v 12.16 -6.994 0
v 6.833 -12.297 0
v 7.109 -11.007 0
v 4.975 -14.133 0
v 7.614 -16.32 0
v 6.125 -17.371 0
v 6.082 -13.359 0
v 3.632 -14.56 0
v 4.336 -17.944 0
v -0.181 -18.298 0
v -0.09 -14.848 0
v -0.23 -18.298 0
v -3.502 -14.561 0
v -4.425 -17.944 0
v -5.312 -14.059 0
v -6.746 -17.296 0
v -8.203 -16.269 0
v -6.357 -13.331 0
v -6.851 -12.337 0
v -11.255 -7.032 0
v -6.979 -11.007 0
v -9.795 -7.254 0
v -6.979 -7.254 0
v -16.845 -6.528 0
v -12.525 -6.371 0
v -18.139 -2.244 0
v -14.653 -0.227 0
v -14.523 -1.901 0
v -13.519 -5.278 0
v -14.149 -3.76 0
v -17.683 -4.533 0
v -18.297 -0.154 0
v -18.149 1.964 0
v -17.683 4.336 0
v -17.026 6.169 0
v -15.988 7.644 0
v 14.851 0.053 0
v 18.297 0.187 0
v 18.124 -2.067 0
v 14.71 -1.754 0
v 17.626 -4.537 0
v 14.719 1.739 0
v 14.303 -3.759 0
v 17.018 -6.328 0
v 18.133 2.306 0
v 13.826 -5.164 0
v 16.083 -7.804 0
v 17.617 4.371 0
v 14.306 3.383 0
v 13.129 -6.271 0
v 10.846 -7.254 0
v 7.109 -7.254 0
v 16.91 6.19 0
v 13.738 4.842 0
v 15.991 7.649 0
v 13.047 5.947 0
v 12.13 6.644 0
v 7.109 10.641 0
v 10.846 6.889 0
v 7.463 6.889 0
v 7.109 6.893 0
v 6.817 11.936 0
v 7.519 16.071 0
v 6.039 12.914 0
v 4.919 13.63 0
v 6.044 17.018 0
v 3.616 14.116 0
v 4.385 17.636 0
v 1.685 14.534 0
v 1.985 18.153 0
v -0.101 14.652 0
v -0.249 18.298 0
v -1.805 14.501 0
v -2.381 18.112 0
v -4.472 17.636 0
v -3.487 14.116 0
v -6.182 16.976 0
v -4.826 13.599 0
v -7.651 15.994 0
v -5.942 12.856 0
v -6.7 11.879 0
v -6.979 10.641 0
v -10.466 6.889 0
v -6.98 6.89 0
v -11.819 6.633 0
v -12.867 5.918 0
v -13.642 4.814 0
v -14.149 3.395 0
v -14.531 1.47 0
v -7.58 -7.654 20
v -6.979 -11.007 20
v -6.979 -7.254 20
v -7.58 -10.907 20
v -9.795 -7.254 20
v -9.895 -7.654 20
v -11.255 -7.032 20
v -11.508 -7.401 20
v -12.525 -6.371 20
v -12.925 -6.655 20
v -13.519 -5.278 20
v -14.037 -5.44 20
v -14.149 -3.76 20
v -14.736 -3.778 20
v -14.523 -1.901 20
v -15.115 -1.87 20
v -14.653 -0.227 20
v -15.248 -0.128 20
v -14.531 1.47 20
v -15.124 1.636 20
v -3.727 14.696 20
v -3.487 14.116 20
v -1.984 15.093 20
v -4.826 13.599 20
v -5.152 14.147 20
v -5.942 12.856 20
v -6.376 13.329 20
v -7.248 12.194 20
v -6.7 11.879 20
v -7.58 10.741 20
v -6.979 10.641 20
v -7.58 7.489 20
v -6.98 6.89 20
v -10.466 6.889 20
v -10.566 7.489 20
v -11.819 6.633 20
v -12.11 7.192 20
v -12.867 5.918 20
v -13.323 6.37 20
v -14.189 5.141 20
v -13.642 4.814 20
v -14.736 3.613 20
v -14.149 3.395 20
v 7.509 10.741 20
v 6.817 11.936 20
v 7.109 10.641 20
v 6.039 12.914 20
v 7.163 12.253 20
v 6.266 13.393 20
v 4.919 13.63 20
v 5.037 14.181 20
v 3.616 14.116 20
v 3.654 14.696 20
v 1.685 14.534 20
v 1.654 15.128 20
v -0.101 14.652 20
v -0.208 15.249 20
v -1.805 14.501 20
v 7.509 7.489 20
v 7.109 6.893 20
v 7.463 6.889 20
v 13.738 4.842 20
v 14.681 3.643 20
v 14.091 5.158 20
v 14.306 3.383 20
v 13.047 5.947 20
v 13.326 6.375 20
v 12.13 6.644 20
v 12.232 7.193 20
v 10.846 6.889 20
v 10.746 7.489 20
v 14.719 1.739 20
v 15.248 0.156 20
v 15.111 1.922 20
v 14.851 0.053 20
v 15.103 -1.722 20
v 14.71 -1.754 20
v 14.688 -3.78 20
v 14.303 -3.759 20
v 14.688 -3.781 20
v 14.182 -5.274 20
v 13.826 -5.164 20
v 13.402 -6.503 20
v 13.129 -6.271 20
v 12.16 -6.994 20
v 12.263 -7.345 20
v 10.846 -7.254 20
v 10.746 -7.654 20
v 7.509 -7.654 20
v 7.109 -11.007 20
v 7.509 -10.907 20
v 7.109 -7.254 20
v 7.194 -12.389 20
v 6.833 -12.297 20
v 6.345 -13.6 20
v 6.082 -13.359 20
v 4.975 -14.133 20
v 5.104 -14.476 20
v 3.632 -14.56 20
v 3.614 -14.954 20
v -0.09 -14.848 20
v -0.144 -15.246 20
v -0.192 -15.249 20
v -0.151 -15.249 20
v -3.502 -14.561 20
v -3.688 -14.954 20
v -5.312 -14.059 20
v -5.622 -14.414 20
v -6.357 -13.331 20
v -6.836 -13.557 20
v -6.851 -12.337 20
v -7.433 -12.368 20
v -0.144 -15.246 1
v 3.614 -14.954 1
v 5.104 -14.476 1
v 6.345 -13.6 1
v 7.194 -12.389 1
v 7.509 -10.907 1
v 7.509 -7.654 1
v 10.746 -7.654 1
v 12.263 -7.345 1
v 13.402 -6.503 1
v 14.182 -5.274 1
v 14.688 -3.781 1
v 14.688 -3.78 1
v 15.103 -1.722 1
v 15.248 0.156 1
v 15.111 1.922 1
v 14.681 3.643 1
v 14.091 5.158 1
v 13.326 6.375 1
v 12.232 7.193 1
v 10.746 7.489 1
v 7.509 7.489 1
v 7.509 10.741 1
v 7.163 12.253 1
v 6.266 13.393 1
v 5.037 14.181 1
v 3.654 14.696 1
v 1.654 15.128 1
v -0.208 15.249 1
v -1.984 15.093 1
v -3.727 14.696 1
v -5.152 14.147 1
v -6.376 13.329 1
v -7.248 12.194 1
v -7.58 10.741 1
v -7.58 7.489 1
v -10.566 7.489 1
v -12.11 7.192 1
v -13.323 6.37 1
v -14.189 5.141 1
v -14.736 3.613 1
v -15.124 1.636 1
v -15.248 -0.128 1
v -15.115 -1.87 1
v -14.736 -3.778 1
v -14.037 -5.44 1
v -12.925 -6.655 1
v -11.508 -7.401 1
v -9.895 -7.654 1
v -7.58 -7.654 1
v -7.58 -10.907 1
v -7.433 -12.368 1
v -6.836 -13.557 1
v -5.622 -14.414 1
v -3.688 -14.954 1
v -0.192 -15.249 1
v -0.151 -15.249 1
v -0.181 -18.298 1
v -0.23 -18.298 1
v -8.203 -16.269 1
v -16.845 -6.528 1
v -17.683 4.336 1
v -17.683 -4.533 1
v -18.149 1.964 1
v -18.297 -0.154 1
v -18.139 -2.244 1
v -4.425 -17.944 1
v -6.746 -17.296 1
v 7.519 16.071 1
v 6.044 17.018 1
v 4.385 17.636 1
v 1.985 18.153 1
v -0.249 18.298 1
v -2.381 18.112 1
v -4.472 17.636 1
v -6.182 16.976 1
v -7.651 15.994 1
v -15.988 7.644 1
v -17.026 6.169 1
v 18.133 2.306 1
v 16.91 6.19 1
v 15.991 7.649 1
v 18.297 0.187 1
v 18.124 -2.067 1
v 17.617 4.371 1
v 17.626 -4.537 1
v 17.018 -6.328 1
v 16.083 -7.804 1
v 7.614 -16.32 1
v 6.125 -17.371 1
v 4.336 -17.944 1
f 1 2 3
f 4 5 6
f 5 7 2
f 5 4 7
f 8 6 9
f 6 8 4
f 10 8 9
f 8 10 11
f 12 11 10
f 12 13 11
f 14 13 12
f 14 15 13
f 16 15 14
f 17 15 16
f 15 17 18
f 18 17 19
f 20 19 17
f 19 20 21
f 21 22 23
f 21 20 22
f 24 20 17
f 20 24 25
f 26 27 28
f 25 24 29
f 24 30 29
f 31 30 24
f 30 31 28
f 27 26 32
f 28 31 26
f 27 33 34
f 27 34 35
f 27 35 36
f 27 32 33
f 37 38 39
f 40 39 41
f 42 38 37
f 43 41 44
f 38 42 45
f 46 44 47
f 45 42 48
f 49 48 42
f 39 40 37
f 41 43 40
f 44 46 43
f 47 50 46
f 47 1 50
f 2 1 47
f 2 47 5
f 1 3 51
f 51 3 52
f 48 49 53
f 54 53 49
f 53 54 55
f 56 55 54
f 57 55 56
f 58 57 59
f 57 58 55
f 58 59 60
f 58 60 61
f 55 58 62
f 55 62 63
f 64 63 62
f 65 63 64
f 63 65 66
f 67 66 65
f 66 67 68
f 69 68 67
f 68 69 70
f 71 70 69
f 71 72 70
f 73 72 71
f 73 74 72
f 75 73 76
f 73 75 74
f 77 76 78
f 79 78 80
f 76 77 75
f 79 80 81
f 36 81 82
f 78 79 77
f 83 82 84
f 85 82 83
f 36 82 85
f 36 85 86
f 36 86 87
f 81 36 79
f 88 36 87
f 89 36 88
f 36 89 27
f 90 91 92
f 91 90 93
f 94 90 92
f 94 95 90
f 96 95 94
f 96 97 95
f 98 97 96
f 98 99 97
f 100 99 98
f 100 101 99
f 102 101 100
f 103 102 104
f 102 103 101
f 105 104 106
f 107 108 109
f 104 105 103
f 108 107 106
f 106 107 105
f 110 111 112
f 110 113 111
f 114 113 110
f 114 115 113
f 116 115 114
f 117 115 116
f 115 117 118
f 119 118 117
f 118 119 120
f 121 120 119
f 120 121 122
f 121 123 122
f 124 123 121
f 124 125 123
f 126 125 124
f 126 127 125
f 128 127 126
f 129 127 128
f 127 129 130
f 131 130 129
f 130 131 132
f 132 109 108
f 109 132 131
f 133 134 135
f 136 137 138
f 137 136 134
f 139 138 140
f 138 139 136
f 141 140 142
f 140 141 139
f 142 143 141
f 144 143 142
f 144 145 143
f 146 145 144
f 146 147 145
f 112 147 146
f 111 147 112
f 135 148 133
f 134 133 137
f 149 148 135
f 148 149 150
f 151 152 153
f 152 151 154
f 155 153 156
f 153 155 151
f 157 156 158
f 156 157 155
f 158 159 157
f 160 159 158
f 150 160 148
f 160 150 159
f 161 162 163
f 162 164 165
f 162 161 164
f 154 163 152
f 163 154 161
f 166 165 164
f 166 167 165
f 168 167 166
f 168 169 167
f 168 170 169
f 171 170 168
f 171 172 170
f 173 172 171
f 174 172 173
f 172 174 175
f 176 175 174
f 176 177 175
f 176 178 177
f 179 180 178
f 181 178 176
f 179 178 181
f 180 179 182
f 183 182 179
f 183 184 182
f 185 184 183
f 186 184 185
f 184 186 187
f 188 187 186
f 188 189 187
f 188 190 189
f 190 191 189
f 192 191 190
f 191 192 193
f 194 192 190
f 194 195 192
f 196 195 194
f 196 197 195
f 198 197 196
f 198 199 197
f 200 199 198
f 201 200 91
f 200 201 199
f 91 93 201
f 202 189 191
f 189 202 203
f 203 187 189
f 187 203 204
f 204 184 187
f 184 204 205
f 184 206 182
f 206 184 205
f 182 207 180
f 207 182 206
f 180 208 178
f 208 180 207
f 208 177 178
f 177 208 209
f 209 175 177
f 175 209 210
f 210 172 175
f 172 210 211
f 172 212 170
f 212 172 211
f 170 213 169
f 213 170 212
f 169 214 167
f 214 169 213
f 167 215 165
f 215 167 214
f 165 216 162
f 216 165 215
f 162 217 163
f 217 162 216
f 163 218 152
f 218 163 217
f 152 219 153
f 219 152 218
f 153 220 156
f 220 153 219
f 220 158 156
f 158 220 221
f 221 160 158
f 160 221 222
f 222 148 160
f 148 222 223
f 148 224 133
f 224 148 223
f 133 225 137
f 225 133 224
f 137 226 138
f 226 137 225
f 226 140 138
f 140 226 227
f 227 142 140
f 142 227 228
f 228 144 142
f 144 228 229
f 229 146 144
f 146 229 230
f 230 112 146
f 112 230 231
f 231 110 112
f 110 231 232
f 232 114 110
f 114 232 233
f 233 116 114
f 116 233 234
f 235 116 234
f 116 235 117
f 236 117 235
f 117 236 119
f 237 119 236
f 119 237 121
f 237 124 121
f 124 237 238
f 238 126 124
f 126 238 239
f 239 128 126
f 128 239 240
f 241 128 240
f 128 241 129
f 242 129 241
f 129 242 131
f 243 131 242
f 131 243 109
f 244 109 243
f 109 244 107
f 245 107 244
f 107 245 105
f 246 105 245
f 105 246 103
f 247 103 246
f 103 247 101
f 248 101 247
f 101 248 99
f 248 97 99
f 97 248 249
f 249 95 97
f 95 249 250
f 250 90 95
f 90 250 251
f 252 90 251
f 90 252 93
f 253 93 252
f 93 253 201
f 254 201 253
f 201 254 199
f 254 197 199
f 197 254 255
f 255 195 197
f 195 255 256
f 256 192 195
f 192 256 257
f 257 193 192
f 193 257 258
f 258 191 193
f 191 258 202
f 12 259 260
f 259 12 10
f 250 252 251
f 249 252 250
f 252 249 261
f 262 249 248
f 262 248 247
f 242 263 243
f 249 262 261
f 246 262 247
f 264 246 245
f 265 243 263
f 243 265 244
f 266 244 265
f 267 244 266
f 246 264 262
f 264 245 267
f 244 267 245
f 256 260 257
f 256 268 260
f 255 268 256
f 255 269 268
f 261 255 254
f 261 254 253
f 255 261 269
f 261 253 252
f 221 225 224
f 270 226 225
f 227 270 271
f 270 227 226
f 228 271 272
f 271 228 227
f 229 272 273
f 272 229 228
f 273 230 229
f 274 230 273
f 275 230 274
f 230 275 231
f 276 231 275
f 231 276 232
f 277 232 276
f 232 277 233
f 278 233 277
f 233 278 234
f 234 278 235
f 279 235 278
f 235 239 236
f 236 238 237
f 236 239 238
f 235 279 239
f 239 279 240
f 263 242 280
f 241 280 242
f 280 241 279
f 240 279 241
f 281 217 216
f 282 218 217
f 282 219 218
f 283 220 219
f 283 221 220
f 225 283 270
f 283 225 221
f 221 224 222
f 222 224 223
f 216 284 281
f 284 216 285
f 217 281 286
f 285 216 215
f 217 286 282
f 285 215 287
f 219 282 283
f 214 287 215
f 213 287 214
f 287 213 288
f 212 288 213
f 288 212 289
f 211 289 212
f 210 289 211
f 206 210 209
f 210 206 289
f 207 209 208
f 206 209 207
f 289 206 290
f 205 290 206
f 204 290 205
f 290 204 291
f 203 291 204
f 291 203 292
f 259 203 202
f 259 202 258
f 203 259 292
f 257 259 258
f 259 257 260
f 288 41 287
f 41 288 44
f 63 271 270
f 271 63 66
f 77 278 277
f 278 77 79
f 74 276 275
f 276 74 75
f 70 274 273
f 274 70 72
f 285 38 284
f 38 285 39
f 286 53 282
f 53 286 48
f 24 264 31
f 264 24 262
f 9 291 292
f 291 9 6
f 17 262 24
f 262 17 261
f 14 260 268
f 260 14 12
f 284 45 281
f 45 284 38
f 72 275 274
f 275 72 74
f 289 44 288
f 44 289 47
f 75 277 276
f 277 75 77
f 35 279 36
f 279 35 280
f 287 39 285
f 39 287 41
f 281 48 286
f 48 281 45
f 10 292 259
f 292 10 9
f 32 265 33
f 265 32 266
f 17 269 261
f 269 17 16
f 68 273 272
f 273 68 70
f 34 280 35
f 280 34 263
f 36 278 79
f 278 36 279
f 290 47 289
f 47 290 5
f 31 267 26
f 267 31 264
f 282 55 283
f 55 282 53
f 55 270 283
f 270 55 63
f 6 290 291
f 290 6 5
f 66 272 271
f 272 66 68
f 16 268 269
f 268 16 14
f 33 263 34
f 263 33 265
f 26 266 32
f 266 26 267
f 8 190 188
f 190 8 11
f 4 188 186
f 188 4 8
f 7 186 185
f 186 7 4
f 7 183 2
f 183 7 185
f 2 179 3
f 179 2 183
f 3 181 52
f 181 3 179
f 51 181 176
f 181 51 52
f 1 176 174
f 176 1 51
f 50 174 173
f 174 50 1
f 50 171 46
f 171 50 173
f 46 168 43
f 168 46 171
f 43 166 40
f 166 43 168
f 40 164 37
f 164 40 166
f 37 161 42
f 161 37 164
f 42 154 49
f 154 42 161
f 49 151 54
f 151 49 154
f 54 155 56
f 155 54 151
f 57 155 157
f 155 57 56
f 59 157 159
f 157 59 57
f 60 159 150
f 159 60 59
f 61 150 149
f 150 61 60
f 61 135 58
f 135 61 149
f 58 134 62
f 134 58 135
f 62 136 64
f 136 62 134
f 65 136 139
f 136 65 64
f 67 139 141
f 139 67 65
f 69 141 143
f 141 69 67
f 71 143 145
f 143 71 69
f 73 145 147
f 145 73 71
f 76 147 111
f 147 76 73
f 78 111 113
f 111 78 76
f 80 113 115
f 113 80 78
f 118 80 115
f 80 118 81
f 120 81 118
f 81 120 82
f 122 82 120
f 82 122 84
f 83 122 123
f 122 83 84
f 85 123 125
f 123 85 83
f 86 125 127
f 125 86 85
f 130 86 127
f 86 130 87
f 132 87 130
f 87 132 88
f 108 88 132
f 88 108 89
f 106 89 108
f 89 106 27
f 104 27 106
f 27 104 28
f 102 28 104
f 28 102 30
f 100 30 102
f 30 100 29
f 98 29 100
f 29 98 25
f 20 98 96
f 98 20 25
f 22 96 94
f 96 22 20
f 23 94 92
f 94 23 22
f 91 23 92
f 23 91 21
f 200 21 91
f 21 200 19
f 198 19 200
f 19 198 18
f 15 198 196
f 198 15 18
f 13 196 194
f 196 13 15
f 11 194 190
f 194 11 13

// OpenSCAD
// file: p-small.scad
// Module names are of the form poly_<inkscape-path-id>().  As a result,
// you can associate a polygon in this OpenSCAD program with the corresponding
// SVG element in the Inkscape document by looking for the XML element with
// the attribute id="inkscape-path-id".

// fudge value is used to ensure that subtracted solids are a tad taller
// in the z dimension than the polygon being subtracted from.  This helps
// keep the resulting .stl file manifold.
fudge = 0.1;

module poly_small_outside(h)
{
  scale([25.4/90, -25.4/90, 1]) union()
  {
    linear_extrude(height=h)
      polygon([[-0.679734,-54.030162],[-13.066453,-52.985242],[-19.919460,-51.072252],[-24.220750,-48.037982],[-26.335665,-43.824909],[-26.857468,-38.647352],[-26.857468,-27.121962],[-35.062547,-27.121962],[-40.777382,-26.223436],[-45.797948,-23.581101],[-49.738410,-19.275114],[-52.212937,-13.385632],[-53.558854,-6.626729],[-54.027497,-0.455063],[-53.588860,5.798193],[-52.212937,12.801868],[-50.275043,18.214431],[-47.209031,22.571398],[-42.908188,25.483293],[-37.439500,26.536238],[-26.857468,26.536238],[-26.857468,38.059678],[-25.680309,43.206576],[-22.591844,47.227648],[-18.253854,50.125676],[-13.205125,52.073348],[-7.030659,53.480244],[-0.736677,54.030402],[5.861166,53.602033],[12.947219,52.073348],[17.846429,50.248923],[22.203078,47.454208],[25.378960,43.416381],[26.607375,38.059678],[26.607375,26.536238],[38.076124,26.536238],[43.341888,25.488771],[47.216754,22.587018],[49.930363,18.276768],[52.017534,12.907338],[53.541683,6.809255],[54.027497,0.552078],[53.515154,-6.103154],[52.044834,-13.395402],[52.044834,-13.397402],[50.251269,-18.685694],[47.488194,-23.043882],[43.451001,-26.025918],[38.076084,-27.120062],[26.607335,-27.120062],[26.607335,-38.647402],[25.492011,-43.898868],[22.482908,-48.188023],[18.085336,-51.291340],[12.804601,-52.985292],[-0.511805,-54.022402],[-0.535245,-54.030402],[-0.679776,-54.030402]]);
  }
}

module poly_small_inside(h)
{
  scale([25.4/90, -25.4/90, 1]) union()
  {
    linear_extrude(height=h)
      polygon([[-0.671934,-52.256722],[12.515566,-51.237192],[17.275067,-49.722572],[21.195235,-46.979009],[23.855648,-43.217078],[24.835879,-38.647352],[24.835879,-25.348522],[38.076114,-25.348522],[42.733361,-24.426672],[46.164004,-21.866102],[48.636473,-17.943498],[50.326114,-12.963762],[51.766064,-5.860205],[52.267054,0.541026],[51.800500,6.516035],[50.337814,12.340928],[50.337814,12.342928],[48.323652,17.511053],[45.876874,21.426918],[42.624878,23.896949],[38.076094,24.764808],[26.089765,24.764808],[24.833938,24.778408],[24.833938,38.059658],[23.799618,42.648442],[21.042922,46.114348],[17.075009,48.648763],[12.458938,50.370208],[5.614963,51.854228],[-0.713910,52.270239],[-6.748352,51.736235],[-12.709031,50.370208],[-12.709031,50.372208],[-17.454269,48.539171],[-21.408250,45.907368],[-24.093600,42.446573],[-25.084031,38.059708],[-25.087931,24.766738],[-37.439494,24.762738],[-42.231199,23.857851],[-45.947306,21.325238],[-48.690483,17.413504],[-50.490275,12.383828],[-51.843203,5.561267],[-52.274909,-0.449141],[-51.814297,-6.380954],[-50.490275,-12.967732],[-48.257570,-18.346479],[-44.734883,-22.219737],[-40.232959,-24.562207],[-35.062541,-25.348592],[-25.084025,-25.348592],[-25.084025,-38.647422],[-24.628636,-43.361149],[-22.880900,-46.881792],[-19.176293,-49.460272],[-12.761759,-51.239222],[-0.671916,-52.256792]]);
  }
}
// main file
include <p-small.scad>;    // poly_path4442

scale([1, -1, 1]) union() {
    difference() {
        union() {
            poly_small_outside(20);
            scale([1.2, 1.2, 1]) hull() {
                poly_small_outside(1);
            }
        }
        translate([0.1,0.1,-1]) {
            poly_small_inside(40);
        }
    }
}
